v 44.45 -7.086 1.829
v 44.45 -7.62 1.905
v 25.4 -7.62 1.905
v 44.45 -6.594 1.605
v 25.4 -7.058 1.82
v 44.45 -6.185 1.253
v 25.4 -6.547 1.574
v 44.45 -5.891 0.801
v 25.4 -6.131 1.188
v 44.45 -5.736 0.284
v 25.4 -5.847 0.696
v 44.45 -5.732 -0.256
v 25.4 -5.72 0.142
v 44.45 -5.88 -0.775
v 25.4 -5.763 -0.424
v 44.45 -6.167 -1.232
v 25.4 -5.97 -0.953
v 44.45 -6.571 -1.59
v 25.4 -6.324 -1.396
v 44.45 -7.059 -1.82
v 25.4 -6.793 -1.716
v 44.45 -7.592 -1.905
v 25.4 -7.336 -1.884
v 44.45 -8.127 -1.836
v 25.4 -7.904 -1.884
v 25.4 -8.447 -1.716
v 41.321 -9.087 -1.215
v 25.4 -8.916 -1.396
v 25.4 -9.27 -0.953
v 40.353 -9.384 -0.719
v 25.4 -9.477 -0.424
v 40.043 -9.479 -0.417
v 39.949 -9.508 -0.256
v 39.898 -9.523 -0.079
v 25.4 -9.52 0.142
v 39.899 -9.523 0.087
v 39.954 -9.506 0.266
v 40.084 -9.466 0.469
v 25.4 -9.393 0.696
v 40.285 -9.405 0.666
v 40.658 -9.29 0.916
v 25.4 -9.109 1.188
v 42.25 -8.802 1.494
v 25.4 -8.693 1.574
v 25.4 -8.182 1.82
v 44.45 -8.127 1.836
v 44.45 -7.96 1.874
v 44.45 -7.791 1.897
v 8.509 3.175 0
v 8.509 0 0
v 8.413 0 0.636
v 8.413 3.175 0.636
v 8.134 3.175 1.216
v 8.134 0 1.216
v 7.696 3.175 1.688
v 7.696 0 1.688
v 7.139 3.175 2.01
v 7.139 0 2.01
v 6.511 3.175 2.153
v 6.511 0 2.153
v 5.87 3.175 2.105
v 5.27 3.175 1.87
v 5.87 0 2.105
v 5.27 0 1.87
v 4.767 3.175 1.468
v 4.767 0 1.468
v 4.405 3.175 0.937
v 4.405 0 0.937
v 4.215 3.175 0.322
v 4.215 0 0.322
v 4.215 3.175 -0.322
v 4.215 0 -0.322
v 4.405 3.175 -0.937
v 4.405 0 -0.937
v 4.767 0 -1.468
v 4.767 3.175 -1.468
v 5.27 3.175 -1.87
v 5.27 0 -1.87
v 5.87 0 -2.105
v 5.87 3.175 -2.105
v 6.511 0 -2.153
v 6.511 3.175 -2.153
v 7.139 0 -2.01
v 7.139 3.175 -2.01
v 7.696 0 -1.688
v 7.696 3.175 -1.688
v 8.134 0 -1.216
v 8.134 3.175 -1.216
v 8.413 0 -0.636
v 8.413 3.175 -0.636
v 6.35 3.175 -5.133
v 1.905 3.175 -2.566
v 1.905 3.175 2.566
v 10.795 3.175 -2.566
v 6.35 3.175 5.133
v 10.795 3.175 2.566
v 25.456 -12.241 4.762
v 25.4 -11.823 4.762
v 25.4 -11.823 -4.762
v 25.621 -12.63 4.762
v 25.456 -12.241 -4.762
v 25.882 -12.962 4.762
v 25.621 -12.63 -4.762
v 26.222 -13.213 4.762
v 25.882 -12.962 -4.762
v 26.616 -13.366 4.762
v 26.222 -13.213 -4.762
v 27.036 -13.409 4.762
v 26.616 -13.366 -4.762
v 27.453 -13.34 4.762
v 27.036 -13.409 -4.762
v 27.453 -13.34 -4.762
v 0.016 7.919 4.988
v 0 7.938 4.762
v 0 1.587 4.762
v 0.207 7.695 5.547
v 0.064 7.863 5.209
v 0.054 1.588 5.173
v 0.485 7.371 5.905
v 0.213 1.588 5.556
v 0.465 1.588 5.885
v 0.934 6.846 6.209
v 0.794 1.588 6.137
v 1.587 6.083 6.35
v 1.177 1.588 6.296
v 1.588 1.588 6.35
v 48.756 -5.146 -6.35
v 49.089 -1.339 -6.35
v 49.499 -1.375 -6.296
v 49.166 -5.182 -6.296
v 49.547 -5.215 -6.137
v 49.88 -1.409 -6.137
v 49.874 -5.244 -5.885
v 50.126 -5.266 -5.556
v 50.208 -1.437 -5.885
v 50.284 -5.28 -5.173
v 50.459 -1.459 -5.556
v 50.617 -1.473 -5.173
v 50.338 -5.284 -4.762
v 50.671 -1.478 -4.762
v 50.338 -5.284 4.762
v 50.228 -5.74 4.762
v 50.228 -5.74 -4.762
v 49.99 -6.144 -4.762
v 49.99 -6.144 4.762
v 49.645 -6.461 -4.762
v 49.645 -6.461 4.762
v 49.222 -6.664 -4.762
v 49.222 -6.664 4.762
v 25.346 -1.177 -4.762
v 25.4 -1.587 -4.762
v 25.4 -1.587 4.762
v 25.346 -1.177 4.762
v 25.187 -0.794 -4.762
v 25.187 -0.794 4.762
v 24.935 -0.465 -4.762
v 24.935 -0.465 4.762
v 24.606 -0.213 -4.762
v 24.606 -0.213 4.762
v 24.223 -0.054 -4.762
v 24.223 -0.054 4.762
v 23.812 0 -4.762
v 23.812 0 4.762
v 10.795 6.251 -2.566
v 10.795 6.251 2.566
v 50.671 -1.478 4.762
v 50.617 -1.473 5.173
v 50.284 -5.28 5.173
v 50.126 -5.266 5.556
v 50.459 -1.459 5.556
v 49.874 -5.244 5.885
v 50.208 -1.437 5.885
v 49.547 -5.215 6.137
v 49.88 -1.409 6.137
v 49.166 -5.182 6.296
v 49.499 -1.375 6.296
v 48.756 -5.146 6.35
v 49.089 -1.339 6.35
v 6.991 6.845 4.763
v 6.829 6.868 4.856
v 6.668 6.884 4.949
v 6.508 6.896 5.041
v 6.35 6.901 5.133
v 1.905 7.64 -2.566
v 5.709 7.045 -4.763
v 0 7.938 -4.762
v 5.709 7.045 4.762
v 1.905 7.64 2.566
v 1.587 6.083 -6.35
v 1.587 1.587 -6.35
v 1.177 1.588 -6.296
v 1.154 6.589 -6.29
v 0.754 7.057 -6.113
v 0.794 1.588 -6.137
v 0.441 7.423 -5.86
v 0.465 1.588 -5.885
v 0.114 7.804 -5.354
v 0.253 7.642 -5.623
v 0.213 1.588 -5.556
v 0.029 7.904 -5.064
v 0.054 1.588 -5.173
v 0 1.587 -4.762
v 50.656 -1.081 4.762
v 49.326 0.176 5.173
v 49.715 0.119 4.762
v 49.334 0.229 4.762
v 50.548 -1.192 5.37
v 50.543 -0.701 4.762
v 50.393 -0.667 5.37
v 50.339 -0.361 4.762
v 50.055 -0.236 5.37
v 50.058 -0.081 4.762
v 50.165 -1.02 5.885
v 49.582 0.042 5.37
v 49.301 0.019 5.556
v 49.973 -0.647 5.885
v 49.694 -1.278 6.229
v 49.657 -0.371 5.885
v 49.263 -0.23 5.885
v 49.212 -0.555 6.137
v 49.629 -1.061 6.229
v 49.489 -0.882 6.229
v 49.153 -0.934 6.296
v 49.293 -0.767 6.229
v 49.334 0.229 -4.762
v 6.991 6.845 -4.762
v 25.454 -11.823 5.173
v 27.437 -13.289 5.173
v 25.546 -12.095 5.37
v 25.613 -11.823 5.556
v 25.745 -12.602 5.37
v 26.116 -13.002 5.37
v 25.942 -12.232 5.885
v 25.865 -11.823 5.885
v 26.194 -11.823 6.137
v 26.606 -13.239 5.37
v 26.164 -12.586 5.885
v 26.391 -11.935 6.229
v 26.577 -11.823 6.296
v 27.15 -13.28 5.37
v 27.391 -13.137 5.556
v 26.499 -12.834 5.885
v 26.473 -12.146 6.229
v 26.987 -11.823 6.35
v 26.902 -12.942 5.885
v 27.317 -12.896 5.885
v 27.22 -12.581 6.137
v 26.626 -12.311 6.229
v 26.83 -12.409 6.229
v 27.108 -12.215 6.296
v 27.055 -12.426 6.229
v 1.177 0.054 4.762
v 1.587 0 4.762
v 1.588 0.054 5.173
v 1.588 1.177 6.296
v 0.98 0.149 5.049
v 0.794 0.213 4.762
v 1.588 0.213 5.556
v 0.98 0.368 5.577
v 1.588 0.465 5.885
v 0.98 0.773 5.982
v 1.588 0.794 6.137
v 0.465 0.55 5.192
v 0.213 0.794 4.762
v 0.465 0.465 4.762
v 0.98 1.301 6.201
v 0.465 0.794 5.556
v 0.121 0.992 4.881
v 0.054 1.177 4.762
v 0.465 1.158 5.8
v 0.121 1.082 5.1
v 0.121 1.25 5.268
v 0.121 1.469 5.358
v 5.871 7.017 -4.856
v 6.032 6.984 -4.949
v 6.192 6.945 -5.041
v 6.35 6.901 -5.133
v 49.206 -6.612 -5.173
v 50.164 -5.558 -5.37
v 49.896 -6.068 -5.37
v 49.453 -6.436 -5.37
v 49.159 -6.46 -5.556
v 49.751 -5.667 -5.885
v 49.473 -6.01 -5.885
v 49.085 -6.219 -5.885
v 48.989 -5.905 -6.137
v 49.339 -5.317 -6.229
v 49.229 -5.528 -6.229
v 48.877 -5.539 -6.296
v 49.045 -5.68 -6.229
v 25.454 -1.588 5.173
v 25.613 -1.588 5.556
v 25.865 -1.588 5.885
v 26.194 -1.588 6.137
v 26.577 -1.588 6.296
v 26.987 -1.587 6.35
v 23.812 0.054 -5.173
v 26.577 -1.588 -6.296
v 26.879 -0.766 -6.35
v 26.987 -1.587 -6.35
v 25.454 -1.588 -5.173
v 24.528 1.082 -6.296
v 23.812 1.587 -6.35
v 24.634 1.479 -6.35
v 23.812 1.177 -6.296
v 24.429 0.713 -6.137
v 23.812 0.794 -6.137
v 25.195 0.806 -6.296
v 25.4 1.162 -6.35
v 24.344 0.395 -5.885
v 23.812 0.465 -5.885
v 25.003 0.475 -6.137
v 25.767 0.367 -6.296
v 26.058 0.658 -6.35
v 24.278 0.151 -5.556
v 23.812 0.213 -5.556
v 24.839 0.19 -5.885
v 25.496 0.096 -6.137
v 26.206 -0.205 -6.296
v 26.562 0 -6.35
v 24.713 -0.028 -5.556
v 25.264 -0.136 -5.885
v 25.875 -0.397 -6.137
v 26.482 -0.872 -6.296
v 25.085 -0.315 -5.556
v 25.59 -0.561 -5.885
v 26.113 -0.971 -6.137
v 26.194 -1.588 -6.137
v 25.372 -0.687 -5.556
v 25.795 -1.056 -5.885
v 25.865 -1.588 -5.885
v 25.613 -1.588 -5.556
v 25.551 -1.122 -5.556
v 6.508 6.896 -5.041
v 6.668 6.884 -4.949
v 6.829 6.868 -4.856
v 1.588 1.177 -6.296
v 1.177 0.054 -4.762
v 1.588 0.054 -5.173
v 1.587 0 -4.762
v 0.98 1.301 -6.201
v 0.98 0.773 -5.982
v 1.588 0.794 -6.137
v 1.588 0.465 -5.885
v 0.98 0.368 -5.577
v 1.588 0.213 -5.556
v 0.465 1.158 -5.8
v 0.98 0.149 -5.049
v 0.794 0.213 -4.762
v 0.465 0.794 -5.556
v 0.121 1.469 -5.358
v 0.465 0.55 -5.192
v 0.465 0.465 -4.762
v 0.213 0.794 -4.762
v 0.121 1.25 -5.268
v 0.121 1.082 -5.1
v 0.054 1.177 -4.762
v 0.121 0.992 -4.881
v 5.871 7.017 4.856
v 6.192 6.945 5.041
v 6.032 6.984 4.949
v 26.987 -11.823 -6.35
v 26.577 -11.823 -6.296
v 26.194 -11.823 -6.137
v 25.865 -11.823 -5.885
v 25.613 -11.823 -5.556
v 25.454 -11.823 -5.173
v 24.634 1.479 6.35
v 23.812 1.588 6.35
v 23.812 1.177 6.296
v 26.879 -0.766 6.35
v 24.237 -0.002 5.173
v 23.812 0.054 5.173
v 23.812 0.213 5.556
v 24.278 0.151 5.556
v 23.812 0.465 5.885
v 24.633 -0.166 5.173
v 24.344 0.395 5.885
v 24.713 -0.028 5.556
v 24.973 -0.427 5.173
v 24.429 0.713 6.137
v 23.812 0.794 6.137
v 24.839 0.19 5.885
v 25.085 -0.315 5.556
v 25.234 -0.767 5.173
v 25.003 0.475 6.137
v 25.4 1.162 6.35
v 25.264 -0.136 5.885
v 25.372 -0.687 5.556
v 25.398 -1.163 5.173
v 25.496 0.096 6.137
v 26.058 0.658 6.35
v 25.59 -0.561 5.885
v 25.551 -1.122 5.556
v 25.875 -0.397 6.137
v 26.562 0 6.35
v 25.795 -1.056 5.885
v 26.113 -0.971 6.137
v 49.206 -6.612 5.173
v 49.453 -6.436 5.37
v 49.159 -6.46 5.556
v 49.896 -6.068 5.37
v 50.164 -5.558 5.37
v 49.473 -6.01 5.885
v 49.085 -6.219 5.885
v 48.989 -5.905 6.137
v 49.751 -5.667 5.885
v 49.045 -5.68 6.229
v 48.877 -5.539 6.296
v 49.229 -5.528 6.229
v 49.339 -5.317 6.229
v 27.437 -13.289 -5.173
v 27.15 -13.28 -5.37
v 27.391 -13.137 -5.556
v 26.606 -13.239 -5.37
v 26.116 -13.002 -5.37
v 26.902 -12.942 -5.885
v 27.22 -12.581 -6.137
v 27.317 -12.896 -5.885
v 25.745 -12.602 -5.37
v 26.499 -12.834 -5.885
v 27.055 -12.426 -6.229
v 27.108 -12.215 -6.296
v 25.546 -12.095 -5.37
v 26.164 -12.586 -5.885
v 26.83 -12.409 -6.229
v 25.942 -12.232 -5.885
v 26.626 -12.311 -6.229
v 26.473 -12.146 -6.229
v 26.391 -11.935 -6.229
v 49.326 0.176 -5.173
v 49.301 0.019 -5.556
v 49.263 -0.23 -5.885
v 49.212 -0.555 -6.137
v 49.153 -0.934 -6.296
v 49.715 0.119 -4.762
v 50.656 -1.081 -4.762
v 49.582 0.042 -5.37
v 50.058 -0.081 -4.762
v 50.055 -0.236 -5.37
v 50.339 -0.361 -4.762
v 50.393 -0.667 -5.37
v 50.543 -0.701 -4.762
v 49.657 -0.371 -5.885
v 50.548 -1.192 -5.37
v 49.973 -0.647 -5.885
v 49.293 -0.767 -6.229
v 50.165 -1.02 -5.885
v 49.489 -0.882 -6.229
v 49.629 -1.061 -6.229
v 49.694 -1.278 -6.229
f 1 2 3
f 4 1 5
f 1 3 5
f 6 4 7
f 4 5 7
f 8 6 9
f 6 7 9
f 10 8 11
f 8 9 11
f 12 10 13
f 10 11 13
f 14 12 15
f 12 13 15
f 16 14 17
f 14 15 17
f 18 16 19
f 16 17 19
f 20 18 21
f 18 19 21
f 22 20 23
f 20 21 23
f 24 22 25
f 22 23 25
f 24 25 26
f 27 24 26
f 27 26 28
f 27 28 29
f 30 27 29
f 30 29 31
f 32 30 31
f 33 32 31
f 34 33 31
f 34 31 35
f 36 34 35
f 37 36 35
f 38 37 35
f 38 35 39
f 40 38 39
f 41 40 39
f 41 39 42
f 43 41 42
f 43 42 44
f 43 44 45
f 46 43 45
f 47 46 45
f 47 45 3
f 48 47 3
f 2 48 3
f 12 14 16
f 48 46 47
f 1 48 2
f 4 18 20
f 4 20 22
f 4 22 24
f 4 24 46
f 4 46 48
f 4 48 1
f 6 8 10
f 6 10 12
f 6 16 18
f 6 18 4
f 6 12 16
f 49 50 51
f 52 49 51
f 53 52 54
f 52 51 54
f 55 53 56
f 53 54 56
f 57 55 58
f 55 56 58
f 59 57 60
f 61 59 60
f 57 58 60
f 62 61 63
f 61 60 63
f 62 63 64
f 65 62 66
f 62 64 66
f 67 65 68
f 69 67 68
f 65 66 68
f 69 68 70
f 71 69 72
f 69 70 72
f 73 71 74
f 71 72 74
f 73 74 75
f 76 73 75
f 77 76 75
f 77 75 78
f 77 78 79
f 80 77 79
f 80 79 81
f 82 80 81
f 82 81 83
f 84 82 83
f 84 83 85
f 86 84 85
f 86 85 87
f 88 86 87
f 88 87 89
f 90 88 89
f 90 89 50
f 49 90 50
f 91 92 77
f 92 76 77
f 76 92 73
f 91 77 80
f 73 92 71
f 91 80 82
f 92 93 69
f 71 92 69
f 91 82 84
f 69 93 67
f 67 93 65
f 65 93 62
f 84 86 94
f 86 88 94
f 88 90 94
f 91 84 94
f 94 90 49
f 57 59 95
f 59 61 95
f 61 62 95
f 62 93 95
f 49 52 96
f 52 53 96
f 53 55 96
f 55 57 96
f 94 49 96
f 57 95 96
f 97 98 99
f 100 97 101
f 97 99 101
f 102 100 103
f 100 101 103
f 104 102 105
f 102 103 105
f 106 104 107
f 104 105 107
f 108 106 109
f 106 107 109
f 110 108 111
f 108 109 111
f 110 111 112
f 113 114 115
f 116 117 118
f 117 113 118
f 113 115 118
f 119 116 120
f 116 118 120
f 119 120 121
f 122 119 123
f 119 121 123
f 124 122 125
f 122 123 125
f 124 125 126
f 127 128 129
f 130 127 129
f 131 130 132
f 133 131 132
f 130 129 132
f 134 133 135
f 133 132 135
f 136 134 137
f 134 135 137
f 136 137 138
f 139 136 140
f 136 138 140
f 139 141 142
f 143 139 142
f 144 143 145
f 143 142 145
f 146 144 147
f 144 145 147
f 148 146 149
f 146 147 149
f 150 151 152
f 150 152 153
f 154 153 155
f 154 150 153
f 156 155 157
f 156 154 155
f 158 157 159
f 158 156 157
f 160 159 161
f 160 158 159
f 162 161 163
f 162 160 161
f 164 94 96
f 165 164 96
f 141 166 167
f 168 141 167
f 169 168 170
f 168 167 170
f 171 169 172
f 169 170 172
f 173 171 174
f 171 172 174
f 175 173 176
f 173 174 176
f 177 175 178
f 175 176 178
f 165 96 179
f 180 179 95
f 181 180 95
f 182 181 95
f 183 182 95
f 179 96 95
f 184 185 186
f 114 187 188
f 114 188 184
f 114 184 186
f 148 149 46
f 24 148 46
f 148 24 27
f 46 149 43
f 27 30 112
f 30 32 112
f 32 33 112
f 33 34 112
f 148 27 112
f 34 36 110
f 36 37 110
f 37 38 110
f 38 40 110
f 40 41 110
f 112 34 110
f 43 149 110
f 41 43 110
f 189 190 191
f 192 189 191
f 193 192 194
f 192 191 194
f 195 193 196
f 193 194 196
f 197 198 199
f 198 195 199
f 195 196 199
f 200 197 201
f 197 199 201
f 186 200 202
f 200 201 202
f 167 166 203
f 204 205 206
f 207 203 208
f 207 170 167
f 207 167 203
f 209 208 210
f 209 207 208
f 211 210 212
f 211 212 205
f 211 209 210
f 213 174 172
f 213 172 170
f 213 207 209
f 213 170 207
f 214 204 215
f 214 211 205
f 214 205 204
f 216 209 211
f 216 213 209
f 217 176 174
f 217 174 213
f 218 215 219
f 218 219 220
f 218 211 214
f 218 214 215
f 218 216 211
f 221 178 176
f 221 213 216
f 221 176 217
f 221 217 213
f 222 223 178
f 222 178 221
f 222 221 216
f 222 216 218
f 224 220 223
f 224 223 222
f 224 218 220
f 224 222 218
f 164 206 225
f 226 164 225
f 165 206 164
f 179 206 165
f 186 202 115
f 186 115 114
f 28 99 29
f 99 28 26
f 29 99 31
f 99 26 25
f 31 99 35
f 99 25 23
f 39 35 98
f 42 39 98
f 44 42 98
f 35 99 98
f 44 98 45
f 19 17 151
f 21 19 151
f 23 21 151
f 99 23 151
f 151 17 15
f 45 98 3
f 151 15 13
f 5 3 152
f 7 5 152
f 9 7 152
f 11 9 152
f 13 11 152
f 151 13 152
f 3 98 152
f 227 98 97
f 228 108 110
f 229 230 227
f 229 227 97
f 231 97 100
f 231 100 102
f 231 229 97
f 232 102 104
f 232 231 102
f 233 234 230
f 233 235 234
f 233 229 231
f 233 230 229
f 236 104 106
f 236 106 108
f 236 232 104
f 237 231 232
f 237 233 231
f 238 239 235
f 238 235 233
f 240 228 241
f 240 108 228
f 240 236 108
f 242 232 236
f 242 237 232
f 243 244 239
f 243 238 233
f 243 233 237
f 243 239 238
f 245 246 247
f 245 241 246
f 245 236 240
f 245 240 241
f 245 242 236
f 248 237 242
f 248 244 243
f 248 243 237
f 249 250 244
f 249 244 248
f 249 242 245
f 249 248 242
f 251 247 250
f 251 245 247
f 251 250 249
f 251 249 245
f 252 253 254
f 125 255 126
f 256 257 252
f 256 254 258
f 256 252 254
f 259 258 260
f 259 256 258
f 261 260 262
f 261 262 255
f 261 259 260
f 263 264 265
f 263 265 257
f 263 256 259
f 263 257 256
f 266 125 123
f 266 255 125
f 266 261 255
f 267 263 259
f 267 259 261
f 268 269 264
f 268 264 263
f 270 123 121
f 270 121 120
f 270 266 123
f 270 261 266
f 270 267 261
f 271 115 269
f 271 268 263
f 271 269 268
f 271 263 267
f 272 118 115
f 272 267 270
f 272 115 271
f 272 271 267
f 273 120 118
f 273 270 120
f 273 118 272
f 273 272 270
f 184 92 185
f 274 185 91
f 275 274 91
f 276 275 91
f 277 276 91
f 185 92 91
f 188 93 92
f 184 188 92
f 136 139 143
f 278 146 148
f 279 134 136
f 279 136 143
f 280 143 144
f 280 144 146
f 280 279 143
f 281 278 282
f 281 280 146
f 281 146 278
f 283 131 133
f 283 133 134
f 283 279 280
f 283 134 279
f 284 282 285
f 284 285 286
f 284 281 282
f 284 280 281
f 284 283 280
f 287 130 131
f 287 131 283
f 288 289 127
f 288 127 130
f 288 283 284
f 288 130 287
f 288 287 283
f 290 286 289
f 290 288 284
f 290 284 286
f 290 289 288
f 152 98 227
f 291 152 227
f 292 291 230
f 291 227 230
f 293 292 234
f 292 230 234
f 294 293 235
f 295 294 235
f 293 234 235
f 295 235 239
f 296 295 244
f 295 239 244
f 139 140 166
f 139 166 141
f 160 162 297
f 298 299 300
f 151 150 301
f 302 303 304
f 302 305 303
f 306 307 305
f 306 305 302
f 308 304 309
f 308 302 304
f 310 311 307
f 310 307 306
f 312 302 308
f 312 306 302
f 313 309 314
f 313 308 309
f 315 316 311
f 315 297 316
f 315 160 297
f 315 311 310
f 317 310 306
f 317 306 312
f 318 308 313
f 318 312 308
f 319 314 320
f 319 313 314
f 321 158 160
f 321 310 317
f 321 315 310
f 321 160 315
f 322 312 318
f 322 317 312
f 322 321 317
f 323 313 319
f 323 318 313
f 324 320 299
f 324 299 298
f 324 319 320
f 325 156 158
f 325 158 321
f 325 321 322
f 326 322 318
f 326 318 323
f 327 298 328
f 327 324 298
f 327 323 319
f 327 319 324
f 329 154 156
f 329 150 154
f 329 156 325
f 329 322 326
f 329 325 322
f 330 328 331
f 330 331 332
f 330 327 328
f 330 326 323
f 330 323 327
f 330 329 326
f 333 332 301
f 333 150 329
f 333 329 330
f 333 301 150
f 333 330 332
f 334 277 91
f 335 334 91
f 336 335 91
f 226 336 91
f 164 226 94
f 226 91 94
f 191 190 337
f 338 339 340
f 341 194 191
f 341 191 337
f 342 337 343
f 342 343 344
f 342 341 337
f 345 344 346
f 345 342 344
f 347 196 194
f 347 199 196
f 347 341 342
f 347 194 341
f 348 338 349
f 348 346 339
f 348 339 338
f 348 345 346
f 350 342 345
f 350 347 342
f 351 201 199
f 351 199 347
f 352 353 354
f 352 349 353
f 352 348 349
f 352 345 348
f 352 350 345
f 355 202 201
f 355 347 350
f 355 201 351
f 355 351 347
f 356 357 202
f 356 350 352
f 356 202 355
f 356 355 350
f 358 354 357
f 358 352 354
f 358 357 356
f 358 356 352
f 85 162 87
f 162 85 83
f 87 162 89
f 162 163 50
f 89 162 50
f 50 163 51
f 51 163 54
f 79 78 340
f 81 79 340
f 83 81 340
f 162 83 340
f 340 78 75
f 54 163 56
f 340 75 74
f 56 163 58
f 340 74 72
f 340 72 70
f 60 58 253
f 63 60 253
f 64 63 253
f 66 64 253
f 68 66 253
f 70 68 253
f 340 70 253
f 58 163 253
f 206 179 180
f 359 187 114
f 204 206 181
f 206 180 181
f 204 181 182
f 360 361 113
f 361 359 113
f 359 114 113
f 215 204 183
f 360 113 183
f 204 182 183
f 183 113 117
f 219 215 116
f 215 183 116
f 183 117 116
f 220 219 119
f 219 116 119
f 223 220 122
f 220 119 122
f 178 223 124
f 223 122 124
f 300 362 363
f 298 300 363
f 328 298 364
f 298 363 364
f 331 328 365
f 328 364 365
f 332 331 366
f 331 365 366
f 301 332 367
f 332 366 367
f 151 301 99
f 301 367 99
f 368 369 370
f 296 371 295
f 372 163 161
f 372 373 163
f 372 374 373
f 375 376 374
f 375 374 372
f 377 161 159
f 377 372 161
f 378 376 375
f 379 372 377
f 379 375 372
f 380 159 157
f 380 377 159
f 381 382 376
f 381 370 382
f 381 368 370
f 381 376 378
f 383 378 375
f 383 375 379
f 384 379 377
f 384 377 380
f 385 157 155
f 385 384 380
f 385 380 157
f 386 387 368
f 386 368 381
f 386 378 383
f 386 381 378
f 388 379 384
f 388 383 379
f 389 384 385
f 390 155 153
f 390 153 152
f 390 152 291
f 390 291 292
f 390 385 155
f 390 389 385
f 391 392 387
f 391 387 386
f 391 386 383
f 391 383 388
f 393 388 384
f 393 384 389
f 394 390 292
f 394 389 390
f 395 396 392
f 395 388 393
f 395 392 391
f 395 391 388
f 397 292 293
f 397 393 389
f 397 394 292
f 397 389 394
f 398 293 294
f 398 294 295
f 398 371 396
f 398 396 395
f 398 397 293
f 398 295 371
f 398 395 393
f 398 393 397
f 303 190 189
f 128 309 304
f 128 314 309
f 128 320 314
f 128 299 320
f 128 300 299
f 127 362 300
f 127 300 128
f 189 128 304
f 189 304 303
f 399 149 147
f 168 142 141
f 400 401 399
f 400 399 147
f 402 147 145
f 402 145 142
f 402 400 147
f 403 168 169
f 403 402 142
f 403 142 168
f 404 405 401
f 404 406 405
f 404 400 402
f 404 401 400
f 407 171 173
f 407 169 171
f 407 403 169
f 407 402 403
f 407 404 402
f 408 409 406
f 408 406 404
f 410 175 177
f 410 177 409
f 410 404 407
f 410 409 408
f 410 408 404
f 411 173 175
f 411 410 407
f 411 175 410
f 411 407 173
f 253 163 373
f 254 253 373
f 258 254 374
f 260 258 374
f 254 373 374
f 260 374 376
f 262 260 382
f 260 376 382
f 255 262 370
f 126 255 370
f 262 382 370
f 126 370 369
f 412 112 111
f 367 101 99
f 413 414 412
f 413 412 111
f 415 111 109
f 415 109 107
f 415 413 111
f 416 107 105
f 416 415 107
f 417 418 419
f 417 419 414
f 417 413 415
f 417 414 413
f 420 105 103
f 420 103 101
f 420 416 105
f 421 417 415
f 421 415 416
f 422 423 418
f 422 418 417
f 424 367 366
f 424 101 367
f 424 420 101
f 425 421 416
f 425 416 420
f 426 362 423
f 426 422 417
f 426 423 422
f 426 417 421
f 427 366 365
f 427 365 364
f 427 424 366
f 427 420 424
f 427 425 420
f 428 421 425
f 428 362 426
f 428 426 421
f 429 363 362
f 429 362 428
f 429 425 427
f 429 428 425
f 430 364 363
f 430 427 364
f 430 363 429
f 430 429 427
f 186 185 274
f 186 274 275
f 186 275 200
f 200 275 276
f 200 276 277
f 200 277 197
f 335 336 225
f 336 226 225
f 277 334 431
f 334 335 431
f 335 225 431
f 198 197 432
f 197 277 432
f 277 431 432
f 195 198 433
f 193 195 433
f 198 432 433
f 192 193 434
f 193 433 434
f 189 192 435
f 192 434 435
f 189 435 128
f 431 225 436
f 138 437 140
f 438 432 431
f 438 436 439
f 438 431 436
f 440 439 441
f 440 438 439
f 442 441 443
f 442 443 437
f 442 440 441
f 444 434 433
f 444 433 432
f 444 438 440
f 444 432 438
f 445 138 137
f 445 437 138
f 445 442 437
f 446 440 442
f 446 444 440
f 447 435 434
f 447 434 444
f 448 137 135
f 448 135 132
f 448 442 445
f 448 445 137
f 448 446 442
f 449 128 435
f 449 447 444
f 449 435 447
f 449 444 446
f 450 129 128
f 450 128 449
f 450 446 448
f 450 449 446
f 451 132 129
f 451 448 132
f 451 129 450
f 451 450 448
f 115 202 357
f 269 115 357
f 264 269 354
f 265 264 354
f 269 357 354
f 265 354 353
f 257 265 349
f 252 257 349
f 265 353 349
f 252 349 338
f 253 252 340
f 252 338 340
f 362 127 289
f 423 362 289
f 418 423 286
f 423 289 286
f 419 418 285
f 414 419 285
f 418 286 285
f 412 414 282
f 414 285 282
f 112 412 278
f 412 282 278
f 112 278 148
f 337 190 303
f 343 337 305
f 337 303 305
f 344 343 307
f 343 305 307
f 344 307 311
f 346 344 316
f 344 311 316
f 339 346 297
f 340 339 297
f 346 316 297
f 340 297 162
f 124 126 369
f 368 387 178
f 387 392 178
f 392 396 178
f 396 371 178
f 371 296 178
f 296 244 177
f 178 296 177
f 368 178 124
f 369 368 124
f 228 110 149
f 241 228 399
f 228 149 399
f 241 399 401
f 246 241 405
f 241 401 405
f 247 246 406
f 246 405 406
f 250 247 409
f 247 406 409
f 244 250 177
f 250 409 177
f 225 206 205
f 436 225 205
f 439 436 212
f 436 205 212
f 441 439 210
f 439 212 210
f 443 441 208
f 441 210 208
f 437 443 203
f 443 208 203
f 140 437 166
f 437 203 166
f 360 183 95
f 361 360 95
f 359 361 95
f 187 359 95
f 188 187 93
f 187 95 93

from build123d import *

# Parameters (mm, degrees)
BOSS_EXTRUDE1_DEPTH = 6.35
CUT_EXTRUDE1_REACH  = 55.067
SKETCH2_R           = 2.159
CUT_EXTRUDE2_REACH  = 58.242
CUT_EXTRUDE2_START  = -3.175
SKETCH4_R           = 1.905
CUT_EXTRUDE3_DEPTH  = 19.05
FILLET1_R           = 1.5875


with BuildPart() as part:
    # Sketch1 → Boss-Extrude1 (new, symmetric)
    with BuildSketch(Plane.XY):
        Polygon((0, 0), (0, 7.9375), (25.4, 3.96875), (50.8, 0), (50.244446987, -6.35), (25.4, -13.97), (25.4, 0), align=None)
    extrude(amount=BOSS_EXTRUDE1_DEPTH, both=True)

    # Cut-Extrude1: up to this plane
    cut_extrude1_end = Plane(origin=(0, 7.9375, 6.35), z_dir=(-0.15437688027360963, -0.9880120337511015, 0))
    # Sketch2 → Cut-Extrude1 (cut, up to the surface)
    with BuildSketch(Plane(origin=(0, 0, 0), x_dir=(-1, 0, 0), z_dir=(0, -1, 0)), mode=Mode.PRIVATE) as cut_extrude1_sk1:
        with Locations(Location((-6.35, 0, 0), (0, 0, 180))):
            Circle(SKETCH2_R)
    cut_extrude1_tool1 = split(extrude(cut_extrude1_sk1.sketch, amount=-CUT_EXTRUDE1_REACH, mode=Mode.PRIVATE), bisect_by=cut_extrude1_end, keep=Keep.BOTH, mode=Mode.PRIVATE)
    add(cut_extrude1_tool1.solids().sort_by_distance((6.35, 0, 0))[0], mode=Mode.SUBTRACT)

    # Cut-Extrude2: up to this plane
    cut_extrude2_end = Plane(origin=(0, 7.9375, 6.35), z_dir=(-0.15437688027360963, -0.9880120337511015, 0))
    # Sketch3 → Cut-Extrude2 (cut, up to the surface)
    with BuildSketch(Plane.XZ.offset(CUT_EXTRUDE2_START), mode=Mode.PRIVATE) as cut_extrude2_sk1:
        Polygon((6.35, 5.132643893), (1.905, 2.566321947), (1.905, -2.566321947), (6.35, -5.132643893), (10.795, -2.566321947), (10.795, 2.566321947), align=None)
    cut_extrude2_tool1 = split(extrude(cut_extrude2_sk1.sketch, amount=-CUT_EXTRUDE2_REACH, mode=Mode.PRIVATE), bisect_by=cut_extrude2_end, keep=Keep.BOTH, mode=Mode.PRIVATE)
    add(cut_extrude2_tool1.solids().sort_by_distance((6.35, 3.175, 0))[0], mode=Mode.SUBTRACT)

    # Sketch4 → Cut-Extrude3 (cut)
    with BuildSketch(Plane.ZY.offset(-25.4)):
        with Locations((0, -7.62)):
            Circle(SKETCH4_R)
    extrude(amount=-CUT_EXTRUDE3_DEPTH, mode=Mode.SUBTRACT)

    # Fillet1
    # the kernel refuses this fillet: 1.5875 mm, written as the material it adds along each edge
    with BuildSketch(Plane(origin=(25.4, 0, -6.35), x_dir=(-1, 0, 0), z_dir=(0, 0, 1))) as fillet1_piece_1:
        with BuildLine():
            CenterArc((FILLET1_R, FILLET1_R), FILLET1_R, 180, 90)
            Line((0, FILLET1_R), (0, 0))
            Line((0, 0), (FILLET1_R, 0))
        make_face()
    extrude(amount=12.7)
    # the kernel refuses this fillet: 1.5875 mm, written as the material it takes off along each edge
    with BuildSketch(Plane(origin=(1.5875, 1.5875, -4.7625), x_dir=(0, -1, 0), z_dir=(-1, 0, 0))) as fillet1_2_piece_1_section:
        Polygon((0, 0), (FILLET1_R, 0), (FILLET1_R, -FILLET1_R), (0, -FILLET1_R), align=None)
    fillet1_2_piece_1 = extrude(amount=FILLET1_R, mode=Mode.PRIVATE)
    fillet1_2_piece_1 = fillet1_2_piece_1 - Plane(origin=(1.5875, 1.5875, -4.7625), x_dir=(0, 0.7071067811865475, 0.7071067811865475), z_dir=(-1, 0, 0)) * Sphere(FILLET1_R, mode=Mode.PRIVATE)
    add(fillet1_2_piece_1, mode=Mode.SUBTRACT)
    with BuildSketch(Plane(origin=(1.5875, 1.5875, 4.7625), x_dir=(0, -1, 0), z_dir=(-1, 0, 0))) as fillet1_2_piece_2_section:
        Polygon((0, 0), (FILLET1_R, 0), (FILLET1_R, FILLET1_R), (0, FILLET1_R), align=None)
    fillet1_2_piece_2 = extrude(amount=FILLET1_R, mode=Mode.PRIVATE)
    fillet1_2_piece_2 = fillet1_2_piece_2 - Plane(origin=(1.5875, 1.5875, 4.7625), x_dir=(0, 0.7071067811865475, -0.7071067811865475), z_dir=(-1, 0, 0)) * Sphere(FILLET1_R, mode=Mode.PRIVATE)
    add(fillet1_2_piece_2, mode=Mode.SUBTRACT)
    with BuildSketch(Plane(origin=(48.756222782, -5.145960715, 4.7625), x_dir=(0.9961946980917461, -0.08715574274765191, 0), z_dir=(0, 0, 1))) as fillet1_2_piece_3_section:
        Polygon((0, 0), (FILLET1_R, 0), (FILLET1_R, -FILLET1_R * 0.67385843517), (FILLET1_R * 0.375435230935, -FILLET1_R * 0.926848632395), align=None)
    fillet1_2_piece_3 = extrude(amount=FILLET1_R, mode=Mode.PRIVATE)
    fillet1_2_piece_3 = fillet1_2_piece_3 - Plane(origin=(48.756222782, -5.145960715, 4.7625), x_dir=(-0.7774271509889946, 0.6289729921905509, 0), z_dir=(0, 0, 1)) * Sphere(FILLET1_R, mode=Mode.PRIVATE)
    add(fillet1_2_piece_3, mode=Mode.SUBTRACT)
    with BuildSketch(Plane(origin=(26.9875, -11.822610338, 4.7625), x_dir=(0.2932264055627704, -0.9560430299315705, 0), z_dir=(0, 0, 1))) as fillet1_2_piece_4_section:
        Polygon((0, 0), (FILLET1_R, 0), (FILLET1_R, -FILLET1_R * 1.35268640121), (-FILLET1_R * 0.293226405563, -FILLET1_R * 0.956043029932), align=None)
    fillet1_2_piece_4 = extrude(amount=FILLET1_R, mode=Mode.PRIVATE)
    fillet1_2_piece_4 = fillet1_2_piece_4 - Plane(origin=(26.9875, -11.822610338, 4.7625), x_dir=(0.5944634532236736, 0.8041226291936978, 0), z_dir=(0, 0, 1)) * Sphere(FILLET1_R, mode=Mode.PRIVATE)
    add(fillet1_2_piece_4, mode=Mode.SUBTRACT)
    with BuildSketch(Plane(origin=(49.089248712, -1.339456918, 4.7625), x_dir=(0.9961946980917461, -0.08715574274765191, 0), z_dir=(0, 0, 1))) as fillet1_2_piece_5_section:
        Polygon((0, 0), (FILLET1_R, 0), (FILLET1_R, FILLET1_R * 0.934464049622), (FILLET1_R * 0.0676785069913, FILLET1_R * 0.997707181337), align=None)
    fillet1_2_piece_5 = extrude(amount=FILLET1_R, mode=Mode.PRIVATE)
    fillet1_2_piece_5 = fillet1_2_piece_5 - Plane(origin=(49.089248712, -1.339456918, 4.7625), x_dir=(-0.7873691485833406, -0.6164818114584931, 0), z_dir=(0, 0, 1)) * Sphere(FILLET1_R, mode=Mode.PRIVATE)
    add(fillet1_2_piece_5, mode=Mode.SUBTRACT)
    with BuildSketch(Plane(origin=(49.089248712, -1.339456918, -4.7625), x_dir=(0.15437688027360963, 0.9880120337511015, 0), z_dir=(0, 0, -1))) as fillet1_2_piece_6_section:
        Polygon((0, 0), (FILLET1_R, 0), (FILLET1_R, FILLET1_R * 0.934464049622), (FILLET1_R * 0.0676785069913, FILLET1_R * 0.997707181337), align=None)
    fillet1_2_piece_6 = extrude(amount=FILLET1_R, mode=Mode.PRIVATE)
    fillet1_2_piece_6 = fillet1_2_piece_6 - Plane(origin=(49.089248712, -1.339456918, -4.7625), x_dir=(-0.7873691485833406, -0.6164818114584931, 0), z_dir=(0, 0, -1)) * Sphere(FILLET1_R, mode=Mode.PRIVATE)
    add(fillet1_2_piece_6, mode=Mode.SUBTRACT)
    with BuildSketch(Plane(origin=(48.756222782, -5.145960715, -4.7625), x_dir=(0.9961946980917461, -0.08715574274765191, 0), z_dir=(0, 0, -1))) as fillet1_2_piece_7_section:
        Polygon((0, 0), (FILLET1_R, 0), (FILLET1_R, FILLET1_R * 0.67385843517), (FILLET1_R * 0.375435230935, FILLET1_R * 0.926848632395), align=None)
    fillet1_2_piece_7 = extrude(amount=FILLET1_R, mode=Mode.PRIVATE)
    fillet1_2_piece_7 = fillet1_2_piece_7 - Plane(origin=(48.756222782, -5.145960715, -4.7625), x_dir=(-0.7774271509889946, 0.6289729921905509, 0), z_dir=(0, 0, -1)) * Sphere(FILLET1_R, mode=Mode.PRIVATE)
    add(fillet1_2_piece_7, mode=Mode.SUBTRACT)
    with BuildSketch(Plane(origin=(26.9875, -11.822610338, -4.7625), x_dir=(0.2932264055627704, -0.9560430299315705, 0), z_dir=(0, 0, -1))) as fillet1_2_piece_8_section:
        Polygon((0, 0), (FILLET1_R, 0), (FILLET1_R, FILLET1_R * 1.35268640121), (-FILLET1_R * 0.293226405563, FILLET1_R * 0.956043029932), align=None)
    fillet1_2_piece_8 = extrude(amount=FILLET1_R, mode=Mode.PRIVATE)
    fillet1_2_piece_8 = fillet1_2_piece_8 - Plane(origin=(26.9875, -11.822610338, -4.7625), x_dir=(0.5944634532236736, 0.8041226291936978, 0), z_dir=(0, 0, -1)) * Sphere(FILLET1_R, mode=Mode.PRIVATE)
    add(fillet1_2_piece_8, mode=Mode.SUBTRACT)
    with BuildSketch(Plane(origin=(23.8125, 0, -6.35), x_dir=(0, 0, 1), z_dir=(-1, 0, 0))) as fillet1_2_piece_9:
        with BuildLine():
            CenterArc((FILLET1_R, FILLET1_R), FILLET1_R, 180, 90)
            Line((0, FILLET1_R), (0, 0))
            Line((0, 0), (FILLET1_R, 0))
        make_face()
    extrude(amount=22.225, mode=Mode.SUBTRACT)
    with BuildSketch(Plane(origin=(0, 0, -4.7625), x_dir=(0, 1, 0), z_dir=(0, 0, 1))) as fillet1_2_piece_10:
        with BuildLine():
            CenterArc((FILLET1_R, -FILLET1_R), FILLET1_R, 90, 90)
            Line((0, -FILLET1_R), (0, 0))
            Line((0, 0), (FILLET1_R, 0))
        make_face()
    extrude(amount=9.525, mode=Mode.SUBTRACT)
    with BuildSketch(Plane(origin=(49.221719701, -6.663679025, 6.35), x_dir=(-0.2932264055627704, 0.9560430299315705, 0), z_dir=(-0.9560430299315705, -0.2932264055627704, 0))) as fillet1_2_piece_11:
        with BuildLine():
            CenterArc((FILLET1_R, FILLET1_R), FILLET1_R, 180, 90)
            Line((0, FILLET1_R), (0, 0))
            Line((0, 0), (FILLET1_R, 0))
        make_face()
    extrude(amount=22.769605657, mode=Mode.SUBTRACT)
    with BuildSketch(Plane(origin=(50.8, 0, 4.7625), x_dir=(-0.9880120337511016, 0.15437688027360932, 0), z_dir=(0, 0, -1))) as fillet1_2_piece_12:
        with BuildLine():
            CenterArc((FILLET1_R * 0.934464049622, -FILLET1_R), FILLET1_R, 90, 86.119340849)
            Line((-FILLET1_R * 0.0632431317154, -FILLET1_R * 0.932321493009), (0, 0))
            Line((0, 0), (FILLET1_R * 0.934464049622, 0))
        make_face()
    extrude(amount=9.525, mode=Mode.SUBTRACT)
    with BuildSketch(Plane(origin=(50.244446987, -6.35, 4.7625), x_dir=(0.08715574274764938, 0.9961946980917463, 0), z_dir=(0, 0, -1))) as fillet1_2_piece_13:
        with BuildLine():
            CenterArc((FILLET1_R * 0.67385843517, -FILLET1_R), FILLET1_R, 90, 67.948784684)
            Line((-FILLET1_R * 0.252990197225, -FILLET1_R * 0.624564769065), (0, 0))
            Line((0, 0), (FILLET1_R * 0.67385843517, 0))
        make_face()
    extrude(amount=9.525, mode=Mode.SUBTRACT)
    with BuildSketch(Plane(origin=(25.4, -13.97, -4.7625), x_dir=(0.9560430299315704, 0.2932264055627704, 0), z_dir=(0, 0, 1))) as fillet1_2_piece_14:
        with BuildLine():
            CenterArc((FILLET1_R * 1.35268640121, FILLET1_R), FILLET1_R, 162.948784684, 107.051215316)
            Line((FILLET1_R * 0.396643371281, FILLET1_R * 1.29322640556), (0, 0))
            Line((0, 0), (FILLET1_R * 1.35268640121, 0))
        make_face()
    extrude(amount=9.525, mode=Mode.SUBTRACT)
    with BuildSketch(Plane(origin=(50.670707796, -1.477816659, 6.35), x_dir=(-0.9961946980917462, 0.08715574274765192, 0), z_dir=(-0.08715574274765191, -0.9961946980917461, 0))) as fillet1_2_piece_15:
        with BuildLine():
            CenterArc((FILLET1_R, FILLET1_R), FILLET1_R, 180, 90)
            Line((0, FILLET1_R), (0, 0))
            Line((0, 0), (FILLET1_R, 0))
        make_face()
    extrude(amount=3.821044024, mode=Mode.SUBTRACT)
    with BuildSketch(Plane(origin=(-3.921172759, 8.550183244, 6.35), x_dir=(0, 0, -1), z_dir=(0.9880120337511015, -0.1543768802736096, 0))) as fillet1_2_piece_16:
        with BuildLine():
            CenterArc((FILLET1_R, -FILLET1_R), FILLET1_R, 90, 90)
            Line((0, -FILLET1_R), (0, 0))
            Line((0, 0), (FILLET1_R, 0))
        make_face()
    extrude(amount=53.901666123, mode=Mode.SUBTRACT)
    with BuildSketch(Plane(origin=(0, 1.5875, 6.35), x_dir=(0, 0, -1), z_dir=(0, 1, 0))) as fillet1_2_piece_17:
        with BuildLine():
            CenterArc((FILLET1_R, -FILLET1_R), FILLET1_R, 90, 90)
            Line((0, -FILLET1_R), (0, 0))
            Line((0, 0), (FILLET1_R, 0))
        make_face()
    extrude(amount=10.31875, mode=Mode.SUBTRACT)
    with BuildSketch(Plane(origin=(23.8125, 0, 6.35), x_dir=(0, 0, -1), z_dir=(-1, 0, 0))) as fillet1_2_piece_18:
        with BuildLine():
            CenterArc((FILLET1_R, -FILLET1_R), FILLET1_R, 90, 90)
            Line((0, -FILLET1_R), (0, 0))
            Line((0, 0), (FILLET1_R, 0))
        make_face()
    extrude(amount=22.225, mode=Mode.SUBTRACT)
    with BuildSketch(Plane(origin=(0, 1.5875, -6.35), x_dir=(0, 0, 1), z_dir=(0, 1, 0))) as fillet1_2_piece_19:
        with BuildLine():
            CenterArc((FILLET1_R, FILLET1_R), FILLET1_R, 180, 90)
            Line((0, FILLET1_R), (0, 0))
            Line((0, 0), (FILLET1_R, 0))
        make_face()
    extrude(amount=10.31875, mode=Mode.SUBTRACT)
    with BuildSketch(Plane(origin=(49.33432201, 0.229012186, -6.35), x_dir=(-0.1543768802736096, -0.9880120337511015, 0), z_dir=(-0.9880120337511015, 0.1543768802736096, 0))) as fillet1_2_piece_20:
        with BuildLine():
            CenterArc((FILLET1_R, FILLET1_R), FILLET1_R, 180, 90)
            Line((0, FILLET1_R), (0, 0))
            Line((0, 0), (FILLET1_R, 0))
        make_face()
    extrude(amount=53.901666123, mode=Mode.SUBTRACT)
    with BuildSketch(Plane(origin=(50.670707796, -1.477816659, -6.35), x_dir=(-0.9961946980917462, 0.08715574274765192, 0), z_dir=(-0.08715574274765191, -0.9961946980917461, 0))) as fillet1_2_piece_21:
        with BuildLine():
            CenterArc((FILLET1_R, -FILLET1_R), FILLET1_R, 90, 90)
            Line((0, -FILLET1_R), (0, 0))
            Line((0, 0), (FILLET1_R, 0))
        make_face()
    extrude(amount=3.821044024, mode=Mode.SUBTRACT)
    with BuildSketch(Plane(origin=(25.4, -11.822610338, 6.35), x_dir=(1, 0, 0), z_dir=(0, 1, 0))) as fillet1_2_piece_22:
        with BuildLine():
            CenterArc((FILLET1_R, FILLET1_R), FILLET1_R, 180, 90)
            Line((0, FILLET1_R), (0, 0))
            Line((0, 0), (FILLET1_R, 0))
        make_face()
    extrude(amount=10.235110338, mode=Mode.SUBTRACT)
    with BuildSketch(Plane(origin=(49.221719701, -6.663679025, -6.35), x_dir=(-0.2932264055627704, 0.9560430299315705, 0), z_dir=(-0.9560430299315705, -0.2932264055627704, 0))) as fillet1_2_piece_23:
        with BuildLine():
            CenterArc((FILLET1_R, -FILLET1_R), FILLET1_R, 90, 90)
            Line((0, -FILLET1_R), (0, 0))
            Line((0, 0), (FILLET1_R, 0))
        make_face()
    extrude(amount=22.769605657, mode=Mode.SUBTRACT)
    with BuildSketch(Plane(origin=(25.4, -11.822610338, -6.35), x_dir=(1, 0, 0), z_dir=(0, 1, 0))) as fillet1_2_piece_24:
        with BuildLine():
            CenterArc((FILLET1_R, -FILLET1_R), FILLET1_R, 90, 90)
            Line((0, -FILLET1_R), (0, 0))
            Line((0, 0), (FILLET1_R, 0))
        make_face()
    extrude(amount=10.235110338, mode=Mode.SUBTRACT)
    with BuildSketch(Plane(origin=(23.8125, -1.5875, -6.35), x_dir=(0, 1, 0), z_dir=(-1, 0, 0))) as fillet1_2_piece_25:
        with BuildLine():
            CenterArc((1.5875 + FILLET1_R, -FILLET1_R), FILLET1_R, 90, 90)
            Line((1.5875, -FILLET1_R), (1.5875, 0))
            Line((1.5875, 0), (1.5875 + FILLET1_R, 0))
        make_face()
    revolve(axis=Axis((23.8125, -1.5875, -6.35), (0, 0, -1)), revolution_arc=90, mode=Mode.SUBTRACT)
    with BuildSketch(Plane(origin=(23.8125, -1.5875, 6.35), x_dir=(0, 1, 0), z_dir=(-1, 0, 0))) as fillet1_2_piece_26:
        with BuildLine():
            CenterArc((1.5875 + FILLET1_R, FILLET1_R), FILLET1_R, 180, 90)
            Line((1.5875, FILLET1_R), (1.5875, 0))
            Line((1.5875, 0), (1.5875 + FILLET1_R, 0))
        make_face()
    revolve(axis=Axis((23.8125, -1.5875, 6.35), (0, 0, -1)), revolution_arc=90, mode=Mode.SUBTRACT)


solid = part.part
